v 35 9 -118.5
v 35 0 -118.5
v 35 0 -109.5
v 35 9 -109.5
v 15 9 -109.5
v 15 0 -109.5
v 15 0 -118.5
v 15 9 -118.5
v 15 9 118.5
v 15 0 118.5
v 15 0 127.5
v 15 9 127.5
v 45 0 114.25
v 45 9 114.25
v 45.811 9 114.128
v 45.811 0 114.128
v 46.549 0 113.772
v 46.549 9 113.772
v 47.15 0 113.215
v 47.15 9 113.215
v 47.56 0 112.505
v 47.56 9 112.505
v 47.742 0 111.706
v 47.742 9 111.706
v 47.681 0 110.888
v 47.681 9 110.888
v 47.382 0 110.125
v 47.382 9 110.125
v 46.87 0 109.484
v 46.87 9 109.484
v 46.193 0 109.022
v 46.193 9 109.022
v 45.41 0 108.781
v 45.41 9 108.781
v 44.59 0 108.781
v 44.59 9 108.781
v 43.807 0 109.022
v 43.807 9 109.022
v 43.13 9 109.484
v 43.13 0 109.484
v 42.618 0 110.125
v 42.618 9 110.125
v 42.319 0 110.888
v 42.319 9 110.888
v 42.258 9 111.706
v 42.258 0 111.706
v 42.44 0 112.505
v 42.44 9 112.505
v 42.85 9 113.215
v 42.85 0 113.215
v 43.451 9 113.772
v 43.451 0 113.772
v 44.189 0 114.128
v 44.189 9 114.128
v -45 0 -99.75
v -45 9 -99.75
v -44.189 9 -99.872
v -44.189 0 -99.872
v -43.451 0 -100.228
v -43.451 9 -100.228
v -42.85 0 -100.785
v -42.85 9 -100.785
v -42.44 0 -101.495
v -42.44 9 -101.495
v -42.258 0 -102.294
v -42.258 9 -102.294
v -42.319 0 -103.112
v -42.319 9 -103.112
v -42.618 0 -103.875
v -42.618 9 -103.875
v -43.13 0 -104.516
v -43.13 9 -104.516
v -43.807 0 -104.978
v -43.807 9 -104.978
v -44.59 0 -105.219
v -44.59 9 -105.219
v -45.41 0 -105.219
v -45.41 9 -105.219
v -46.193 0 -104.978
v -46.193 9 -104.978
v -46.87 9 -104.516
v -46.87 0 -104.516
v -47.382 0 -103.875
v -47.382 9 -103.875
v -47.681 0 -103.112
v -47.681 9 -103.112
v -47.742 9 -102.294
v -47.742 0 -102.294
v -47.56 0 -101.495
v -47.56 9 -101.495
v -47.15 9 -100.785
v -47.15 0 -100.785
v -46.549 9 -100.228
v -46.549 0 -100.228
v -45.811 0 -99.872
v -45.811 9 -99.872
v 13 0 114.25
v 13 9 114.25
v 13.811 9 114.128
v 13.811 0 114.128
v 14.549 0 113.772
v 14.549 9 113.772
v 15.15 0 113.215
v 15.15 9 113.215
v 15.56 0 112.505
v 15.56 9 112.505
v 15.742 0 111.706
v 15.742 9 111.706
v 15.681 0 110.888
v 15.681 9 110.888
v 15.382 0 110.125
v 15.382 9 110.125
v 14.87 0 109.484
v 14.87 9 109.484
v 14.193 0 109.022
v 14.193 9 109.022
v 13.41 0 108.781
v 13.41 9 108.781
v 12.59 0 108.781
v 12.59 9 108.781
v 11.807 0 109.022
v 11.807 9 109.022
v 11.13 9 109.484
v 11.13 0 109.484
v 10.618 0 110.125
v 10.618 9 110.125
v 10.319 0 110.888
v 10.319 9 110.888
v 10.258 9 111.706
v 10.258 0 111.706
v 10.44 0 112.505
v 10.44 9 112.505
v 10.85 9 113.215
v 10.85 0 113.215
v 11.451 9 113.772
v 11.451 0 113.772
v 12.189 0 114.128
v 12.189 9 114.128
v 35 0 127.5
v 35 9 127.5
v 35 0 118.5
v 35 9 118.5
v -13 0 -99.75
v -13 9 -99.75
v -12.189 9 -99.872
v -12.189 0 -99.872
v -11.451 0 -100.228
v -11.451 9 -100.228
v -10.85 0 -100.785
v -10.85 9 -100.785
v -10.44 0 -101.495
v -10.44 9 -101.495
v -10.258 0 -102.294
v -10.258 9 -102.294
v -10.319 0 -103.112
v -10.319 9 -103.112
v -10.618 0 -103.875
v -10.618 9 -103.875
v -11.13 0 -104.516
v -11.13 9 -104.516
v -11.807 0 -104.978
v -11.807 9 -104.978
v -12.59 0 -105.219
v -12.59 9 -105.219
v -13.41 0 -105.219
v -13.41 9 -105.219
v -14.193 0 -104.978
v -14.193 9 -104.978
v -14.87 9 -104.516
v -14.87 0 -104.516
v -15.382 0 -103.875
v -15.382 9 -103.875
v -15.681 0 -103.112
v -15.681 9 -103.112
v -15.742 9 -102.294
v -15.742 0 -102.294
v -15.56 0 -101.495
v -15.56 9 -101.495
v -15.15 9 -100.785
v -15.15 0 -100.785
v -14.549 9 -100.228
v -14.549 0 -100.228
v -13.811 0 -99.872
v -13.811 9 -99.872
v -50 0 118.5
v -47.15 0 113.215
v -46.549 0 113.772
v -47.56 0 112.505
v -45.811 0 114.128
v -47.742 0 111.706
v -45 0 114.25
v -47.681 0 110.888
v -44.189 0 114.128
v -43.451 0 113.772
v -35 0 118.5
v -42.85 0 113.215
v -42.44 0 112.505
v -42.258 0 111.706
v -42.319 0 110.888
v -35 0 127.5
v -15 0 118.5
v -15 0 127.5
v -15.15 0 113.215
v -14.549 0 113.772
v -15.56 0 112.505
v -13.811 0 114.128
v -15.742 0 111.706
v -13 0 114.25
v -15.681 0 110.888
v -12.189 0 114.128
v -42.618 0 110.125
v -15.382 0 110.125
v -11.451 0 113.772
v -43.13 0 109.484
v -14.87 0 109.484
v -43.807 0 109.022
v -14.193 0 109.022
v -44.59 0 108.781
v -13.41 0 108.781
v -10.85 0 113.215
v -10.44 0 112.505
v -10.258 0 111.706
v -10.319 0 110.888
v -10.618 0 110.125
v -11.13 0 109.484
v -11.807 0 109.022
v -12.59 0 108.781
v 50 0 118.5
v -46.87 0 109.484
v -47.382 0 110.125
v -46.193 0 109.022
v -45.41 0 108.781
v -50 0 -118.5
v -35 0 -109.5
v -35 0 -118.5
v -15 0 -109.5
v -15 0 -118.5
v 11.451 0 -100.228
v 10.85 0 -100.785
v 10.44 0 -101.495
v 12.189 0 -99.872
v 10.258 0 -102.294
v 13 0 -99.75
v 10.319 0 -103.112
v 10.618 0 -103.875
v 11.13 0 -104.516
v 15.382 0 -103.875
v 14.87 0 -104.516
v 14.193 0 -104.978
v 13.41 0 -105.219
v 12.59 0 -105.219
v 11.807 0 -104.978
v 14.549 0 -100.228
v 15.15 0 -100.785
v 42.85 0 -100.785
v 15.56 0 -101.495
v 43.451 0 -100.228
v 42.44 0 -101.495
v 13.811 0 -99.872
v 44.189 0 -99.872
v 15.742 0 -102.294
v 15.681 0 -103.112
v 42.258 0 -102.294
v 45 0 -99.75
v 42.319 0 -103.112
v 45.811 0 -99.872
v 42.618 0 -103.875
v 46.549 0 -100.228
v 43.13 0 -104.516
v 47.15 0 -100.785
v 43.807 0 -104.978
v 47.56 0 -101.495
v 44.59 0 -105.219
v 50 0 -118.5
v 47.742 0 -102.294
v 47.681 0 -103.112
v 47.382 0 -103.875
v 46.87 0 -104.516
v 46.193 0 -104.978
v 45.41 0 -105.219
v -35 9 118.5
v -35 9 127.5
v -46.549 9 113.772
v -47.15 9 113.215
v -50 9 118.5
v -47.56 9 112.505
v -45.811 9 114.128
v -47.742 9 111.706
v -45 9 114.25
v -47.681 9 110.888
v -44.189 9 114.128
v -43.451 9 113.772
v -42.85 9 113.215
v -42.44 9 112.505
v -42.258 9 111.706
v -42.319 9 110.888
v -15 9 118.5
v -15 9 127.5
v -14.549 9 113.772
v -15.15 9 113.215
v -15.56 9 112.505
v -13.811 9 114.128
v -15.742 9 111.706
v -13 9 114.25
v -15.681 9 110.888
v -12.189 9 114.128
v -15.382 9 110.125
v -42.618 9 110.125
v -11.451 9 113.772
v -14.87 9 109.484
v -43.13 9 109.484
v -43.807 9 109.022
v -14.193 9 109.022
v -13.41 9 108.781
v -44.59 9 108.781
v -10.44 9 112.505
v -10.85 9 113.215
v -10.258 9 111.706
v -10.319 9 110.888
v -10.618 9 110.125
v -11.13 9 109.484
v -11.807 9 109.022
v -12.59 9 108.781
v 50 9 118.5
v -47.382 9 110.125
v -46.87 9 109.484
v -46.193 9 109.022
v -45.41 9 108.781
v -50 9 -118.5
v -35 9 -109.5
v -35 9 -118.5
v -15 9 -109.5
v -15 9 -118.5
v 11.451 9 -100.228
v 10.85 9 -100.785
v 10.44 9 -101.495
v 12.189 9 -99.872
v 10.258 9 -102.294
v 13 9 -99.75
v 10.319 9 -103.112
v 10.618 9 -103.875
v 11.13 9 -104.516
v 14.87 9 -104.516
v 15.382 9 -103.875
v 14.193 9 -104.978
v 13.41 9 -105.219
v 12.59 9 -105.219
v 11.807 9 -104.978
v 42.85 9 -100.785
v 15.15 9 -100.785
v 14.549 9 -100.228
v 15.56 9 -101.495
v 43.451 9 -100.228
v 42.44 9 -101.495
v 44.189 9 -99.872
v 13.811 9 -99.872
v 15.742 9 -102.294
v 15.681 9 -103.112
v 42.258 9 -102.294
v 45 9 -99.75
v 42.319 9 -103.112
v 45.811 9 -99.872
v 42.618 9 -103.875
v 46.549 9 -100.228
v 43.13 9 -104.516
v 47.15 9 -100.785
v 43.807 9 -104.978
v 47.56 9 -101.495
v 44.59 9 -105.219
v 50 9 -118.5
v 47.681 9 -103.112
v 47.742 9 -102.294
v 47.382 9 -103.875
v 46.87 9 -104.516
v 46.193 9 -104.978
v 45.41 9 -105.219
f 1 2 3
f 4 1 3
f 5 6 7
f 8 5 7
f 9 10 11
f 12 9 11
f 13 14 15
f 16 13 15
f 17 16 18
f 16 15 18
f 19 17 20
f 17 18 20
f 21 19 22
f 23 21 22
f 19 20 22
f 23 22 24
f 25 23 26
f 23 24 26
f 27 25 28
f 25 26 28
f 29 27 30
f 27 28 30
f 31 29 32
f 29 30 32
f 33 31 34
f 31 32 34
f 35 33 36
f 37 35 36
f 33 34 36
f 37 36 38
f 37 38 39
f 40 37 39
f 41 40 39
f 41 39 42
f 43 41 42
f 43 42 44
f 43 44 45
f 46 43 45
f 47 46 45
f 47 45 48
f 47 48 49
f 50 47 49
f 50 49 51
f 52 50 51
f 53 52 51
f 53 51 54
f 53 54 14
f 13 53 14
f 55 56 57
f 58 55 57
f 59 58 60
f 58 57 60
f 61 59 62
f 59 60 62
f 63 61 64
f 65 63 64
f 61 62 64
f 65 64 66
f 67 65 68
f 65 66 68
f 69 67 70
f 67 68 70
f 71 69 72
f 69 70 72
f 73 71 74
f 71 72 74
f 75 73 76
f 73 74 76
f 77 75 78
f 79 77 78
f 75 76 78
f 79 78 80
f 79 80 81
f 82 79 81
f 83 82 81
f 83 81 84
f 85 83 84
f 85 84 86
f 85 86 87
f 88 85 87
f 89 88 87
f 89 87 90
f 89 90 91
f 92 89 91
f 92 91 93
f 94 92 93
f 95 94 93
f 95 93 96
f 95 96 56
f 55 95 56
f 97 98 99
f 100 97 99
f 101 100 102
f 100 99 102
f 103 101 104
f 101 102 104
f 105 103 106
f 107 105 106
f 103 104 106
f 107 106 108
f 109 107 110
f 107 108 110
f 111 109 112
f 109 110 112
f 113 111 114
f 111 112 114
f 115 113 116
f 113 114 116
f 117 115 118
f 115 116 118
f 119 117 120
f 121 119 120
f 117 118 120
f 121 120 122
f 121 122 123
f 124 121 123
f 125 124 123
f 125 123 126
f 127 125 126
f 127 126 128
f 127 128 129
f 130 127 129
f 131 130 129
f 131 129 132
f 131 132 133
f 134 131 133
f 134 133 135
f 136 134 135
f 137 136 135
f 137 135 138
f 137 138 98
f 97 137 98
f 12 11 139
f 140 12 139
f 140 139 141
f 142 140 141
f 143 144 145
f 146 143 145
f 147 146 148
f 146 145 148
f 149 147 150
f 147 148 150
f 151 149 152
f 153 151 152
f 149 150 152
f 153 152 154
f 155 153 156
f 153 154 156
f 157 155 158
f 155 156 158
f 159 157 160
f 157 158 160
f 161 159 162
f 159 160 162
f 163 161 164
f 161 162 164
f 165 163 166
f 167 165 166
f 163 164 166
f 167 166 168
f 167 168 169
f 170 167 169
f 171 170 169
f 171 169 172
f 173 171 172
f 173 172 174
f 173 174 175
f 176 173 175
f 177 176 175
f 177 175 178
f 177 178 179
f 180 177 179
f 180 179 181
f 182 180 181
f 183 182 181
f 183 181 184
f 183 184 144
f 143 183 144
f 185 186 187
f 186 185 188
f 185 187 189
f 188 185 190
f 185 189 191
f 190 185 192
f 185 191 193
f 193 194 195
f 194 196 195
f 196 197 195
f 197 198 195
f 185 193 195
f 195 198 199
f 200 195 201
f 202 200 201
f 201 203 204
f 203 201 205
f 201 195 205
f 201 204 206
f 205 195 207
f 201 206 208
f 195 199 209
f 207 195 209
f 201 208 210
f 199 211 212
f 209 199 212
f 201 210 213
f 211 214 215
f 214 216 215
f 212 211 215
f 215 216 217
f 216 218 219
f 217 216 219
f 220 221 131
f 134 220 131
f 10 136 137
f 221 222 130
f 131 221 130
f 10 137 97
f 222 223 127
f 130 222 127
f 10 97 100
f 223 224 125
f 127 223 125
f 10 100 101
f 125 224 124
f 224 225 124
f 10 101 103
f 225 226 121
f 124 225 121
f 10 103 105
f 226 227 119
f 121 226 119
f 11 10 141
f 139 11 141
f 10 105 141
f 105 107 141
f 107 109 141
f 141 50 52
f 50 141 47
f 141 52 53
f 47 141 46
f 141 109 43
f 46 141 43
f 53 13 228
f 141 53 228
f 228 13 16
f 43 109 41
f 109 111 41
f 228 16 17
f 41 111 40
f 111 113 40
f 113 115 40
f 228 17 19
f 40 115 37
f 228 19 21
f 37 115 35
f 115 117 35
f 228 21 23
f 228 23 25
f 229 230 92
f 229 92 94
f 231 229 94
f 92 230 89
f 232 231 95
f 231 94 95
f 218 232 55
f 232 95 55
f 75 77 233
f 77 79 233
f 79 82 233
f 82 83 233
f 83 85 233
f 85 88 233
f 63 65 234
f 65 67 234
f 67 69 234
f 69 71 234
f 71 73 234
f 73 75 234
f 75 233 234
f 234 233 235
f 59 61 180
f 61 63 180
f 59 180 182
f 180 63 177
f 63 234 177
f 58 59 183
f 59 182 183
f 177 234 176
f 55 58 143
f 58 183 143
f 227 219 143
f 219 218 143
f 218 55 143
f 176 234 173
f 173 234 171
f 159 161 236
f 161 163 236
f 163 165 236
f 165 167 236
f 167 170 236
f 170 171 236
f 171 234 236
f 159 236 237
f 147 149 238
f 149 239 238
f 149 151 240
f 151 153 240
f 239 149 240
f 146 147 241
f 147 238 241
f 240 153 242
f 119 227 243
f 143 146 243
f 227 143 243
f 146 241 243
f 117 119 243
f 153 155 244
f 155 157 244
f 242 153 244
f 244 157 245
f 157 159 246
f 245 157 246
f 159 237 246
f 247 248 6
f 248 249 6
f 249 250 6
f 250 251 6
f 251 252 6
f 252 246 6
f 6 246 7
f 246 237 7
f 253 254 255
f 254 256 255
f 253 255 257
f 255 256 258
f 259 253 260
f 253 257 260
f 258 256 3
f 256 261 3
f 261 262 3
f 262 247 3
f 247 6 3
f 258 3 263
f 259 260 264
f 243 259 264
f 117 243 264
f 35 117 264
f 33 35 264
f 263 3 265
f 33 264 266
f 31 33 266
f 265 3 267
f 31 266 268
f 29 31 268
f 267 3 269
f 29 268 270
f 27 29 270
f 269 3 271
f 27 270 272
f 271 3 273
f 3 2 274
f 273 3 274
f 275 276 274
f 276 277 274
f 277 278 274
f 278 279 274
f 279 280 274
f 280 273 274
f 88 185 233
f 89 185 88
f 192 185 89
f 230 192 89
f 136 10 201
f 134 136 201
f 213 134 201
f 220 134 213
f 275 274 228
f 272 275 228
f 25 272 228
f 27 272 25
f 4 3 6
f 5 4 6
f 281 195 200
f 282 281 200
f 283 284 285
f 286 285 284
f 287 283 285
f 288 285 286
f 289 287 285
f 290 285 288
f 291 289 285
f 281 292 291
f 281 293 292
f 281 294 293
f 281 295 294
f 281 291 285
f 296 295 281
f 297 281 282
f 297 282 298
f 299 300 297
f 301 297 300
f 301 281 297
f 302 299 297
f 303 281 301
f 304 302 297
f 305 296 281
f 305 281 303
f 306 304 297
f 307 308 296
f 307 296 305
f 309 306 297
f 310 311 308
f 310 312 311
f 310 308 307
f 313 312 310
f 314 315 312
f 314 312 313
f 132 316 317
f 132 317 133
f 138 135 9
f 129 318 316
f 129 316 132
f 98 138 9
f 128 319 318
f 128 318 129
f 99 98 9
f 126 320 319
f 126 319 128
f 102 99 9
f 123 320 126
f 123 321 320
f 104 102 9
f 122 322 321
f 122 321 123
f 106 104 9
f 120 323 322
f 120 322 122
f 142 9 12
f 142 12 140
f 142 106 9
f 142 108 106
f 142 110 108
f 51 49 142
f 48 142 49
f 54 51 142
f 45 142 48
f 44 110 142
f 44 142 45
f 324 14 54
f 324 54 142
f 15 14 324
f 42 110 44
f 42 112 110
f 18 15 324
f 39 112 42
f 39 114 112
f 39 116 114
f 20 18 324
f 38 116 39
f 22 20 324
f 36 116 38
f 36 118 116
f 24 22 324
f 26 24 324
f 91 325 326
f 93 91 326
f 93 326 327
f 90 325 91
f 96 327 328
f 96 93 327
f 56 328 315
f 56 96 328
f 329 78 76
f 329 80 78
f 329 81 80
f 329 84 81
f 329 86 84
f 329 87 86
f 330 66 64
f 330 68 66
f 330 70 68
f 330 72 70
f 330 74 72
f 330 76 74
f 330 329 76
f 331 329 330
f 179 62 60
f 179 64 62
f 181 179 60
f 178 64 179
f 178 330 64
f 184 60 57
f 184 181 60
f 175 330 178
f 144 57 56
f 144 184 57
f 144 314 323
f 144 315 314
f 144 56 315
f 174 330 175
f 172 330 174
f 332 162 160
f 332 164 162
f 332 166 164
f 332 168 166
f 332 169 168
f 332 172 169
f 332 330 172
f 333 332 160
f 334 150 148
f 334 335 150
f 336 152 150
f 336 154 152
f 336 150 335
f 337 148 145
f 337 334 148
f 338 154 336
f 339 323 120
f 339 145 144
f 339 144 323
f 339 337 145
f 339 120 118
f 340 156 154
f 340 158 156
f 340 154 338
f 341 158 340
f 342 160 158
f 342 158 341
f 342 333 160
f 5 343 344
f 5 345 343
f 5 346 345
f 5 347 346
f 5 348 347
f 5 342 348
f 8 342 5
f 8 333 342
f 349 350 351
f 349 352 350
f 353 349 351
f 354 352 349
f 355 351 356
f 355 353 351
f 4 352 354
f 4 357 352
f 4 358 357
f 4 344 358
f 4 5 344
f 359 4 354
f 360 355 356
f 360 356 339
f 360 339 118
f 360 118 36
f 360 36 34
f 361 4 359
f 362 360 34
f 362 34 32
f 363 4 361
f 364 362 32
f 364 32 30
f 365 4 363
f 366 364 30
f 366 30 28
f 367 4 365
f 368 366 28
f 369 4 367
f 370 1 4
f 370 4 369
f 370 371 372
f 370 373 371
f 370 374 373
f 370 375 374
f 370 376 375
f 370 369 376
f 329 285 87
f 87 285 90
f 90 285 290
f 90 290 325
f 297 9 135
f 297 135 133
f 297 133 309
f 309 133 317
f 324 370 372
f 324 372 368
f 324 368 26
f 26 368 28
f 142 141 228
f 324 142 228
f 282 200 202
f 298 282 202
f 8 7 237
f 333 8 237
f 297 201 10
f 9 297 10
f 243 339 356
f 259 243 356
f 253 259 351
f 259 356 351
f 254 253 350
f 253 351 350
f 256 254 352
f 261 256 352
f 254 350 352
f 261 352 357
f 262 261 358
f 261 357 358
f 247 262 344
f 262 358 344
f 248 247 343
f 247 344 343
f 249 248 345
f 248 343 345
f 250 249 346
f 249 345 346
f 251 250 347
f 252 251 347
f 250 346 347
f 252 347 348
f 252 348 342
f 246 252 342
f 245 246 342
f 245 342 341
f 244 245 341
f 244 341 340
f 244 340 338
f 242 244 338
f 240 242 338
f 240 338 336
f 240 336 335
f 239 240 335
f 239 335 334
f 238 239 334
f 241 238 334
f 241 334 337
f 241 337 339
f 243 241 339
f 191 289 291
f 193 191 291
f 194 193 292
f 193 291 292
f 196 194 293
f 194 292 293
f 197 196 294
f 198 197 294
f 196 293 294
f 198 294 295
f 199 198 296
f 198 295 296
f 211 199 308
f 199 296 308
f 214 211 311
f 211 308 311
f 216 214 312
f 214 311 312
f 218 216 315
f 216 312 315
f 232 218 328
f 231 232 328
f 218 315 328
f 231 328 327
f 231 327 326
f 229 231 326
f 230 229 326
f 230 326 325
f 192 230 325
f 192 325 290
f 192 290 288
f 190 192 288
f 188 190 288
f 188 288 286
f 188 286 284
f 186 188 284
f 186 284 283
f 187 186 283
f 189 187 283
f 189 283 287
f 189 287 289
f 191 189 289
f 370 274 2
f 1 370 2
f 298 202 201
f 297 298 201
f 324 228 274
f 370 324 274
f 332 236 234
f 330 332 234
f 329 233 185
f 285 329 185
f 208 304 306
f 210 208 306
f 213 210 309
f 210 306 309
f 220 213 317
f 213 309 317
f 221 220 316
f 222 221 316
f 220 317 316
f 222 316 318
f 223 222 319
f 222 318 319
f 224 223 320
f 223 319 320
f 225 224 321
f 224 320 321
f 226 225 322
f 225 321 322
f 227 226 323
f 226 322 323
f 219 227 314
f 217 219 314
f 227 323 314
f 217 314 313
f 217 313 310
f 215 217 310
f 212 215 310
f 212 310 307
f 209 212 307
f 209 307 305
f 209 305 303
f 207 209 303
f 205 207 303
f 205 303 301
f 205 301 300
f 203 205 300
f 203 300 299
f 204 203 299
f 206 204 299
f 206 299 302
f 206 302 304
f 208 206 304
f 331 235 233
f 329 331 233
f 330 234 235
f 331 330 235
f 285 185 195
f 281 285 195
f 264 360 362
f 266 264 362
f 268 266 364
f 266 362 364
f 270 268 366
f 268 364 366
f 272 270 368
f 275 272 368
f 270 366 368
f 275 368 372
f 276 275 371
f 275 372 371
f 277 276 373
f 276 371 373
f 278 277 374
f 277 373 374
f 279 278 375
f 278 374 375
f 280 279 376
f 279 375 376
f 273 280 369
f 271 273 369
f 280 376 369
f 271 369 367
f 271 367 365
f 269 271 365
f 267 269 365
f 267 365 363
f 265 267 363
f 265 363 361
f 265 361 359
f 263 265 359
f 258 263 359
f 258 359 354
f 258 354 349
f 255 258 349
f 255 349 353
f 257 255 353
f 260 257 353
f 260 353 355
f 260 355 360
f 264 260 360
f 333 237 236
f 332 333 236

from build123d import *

# Parameters (mm, degrees)
BOSS_EXTRUDE1_DEPTH = 9
SKETCH2_R           = 2.75
CUT_EXTRUDE1_DEPTH  = 10


with BuildPart() as part:
    # Sketch1 → Boss-Extrude1 (new body)
    with BuildSketch(Plane(origin=(0, 0, 0), x_dir=(1, 0, 0), z_dir=(0, 1, 0))):
        Polygon((-35, 118.5), (-50, 118.5), (-50, -118.5), (-35, -118.5), (-35, -127.5), (-15, -127.5), (-15, -118.5), (15, -118.5), (15, -127.5), (35, -127.5), (35, -118.5), (50, -118.5), (50, 118.5), (35, 118.5), (35, 109.5), (15, 109.5), (15, 118.5), (-15, 118.5), (-15, 109.5), (-35, 109.5), align=None)
    extrude(amount=BOSS_EXTRUDE1_DEPTH)

    # Sketch2 → Cut-Extrude1 (cut)
    with BuildSketch(Plane(origin=(0, 9, 0), x_dir=(1, 0, 0), z_dir=(0, 1, 0))):
        with Locations(Location((-45, -111.5, 0), (0, 0, 270))):
            Circle(SKETCH2_R)
        with Locations(Location((-13, -111.5, 0), (0, 0, 270))):
            Circle(SKETCH2_R)
        with Locations(Location((13, -111.5, 0), (0, 0, 270))):
            Circle(SKETCH2_R)
        with Locations(Location((45, -111.5, 0), (0, 0, 270))):
            Circle(SKETCH2_R)
        with Locations(Location((-45, 102.5, 0), (0, 0, 270))):
            Circle(SKETCH2_R)
        with Locations(Location((-13, 102.5, 0), (0, 0, 270))):
            Circle(SKETCH2_R)
        with Locations(Location((13, 102.5, 0), (0, 0, 270))):
            Circle(SKETCH2_R)
        with Locations(Location((45, 102.5, 0), (0, 0, 270))):
            Circle(SKETCH2_R)
    extrude(amount=-CUT_EXTRUDE1_DEPTH, mode=Mode.SUBTRACT)


solid = part.part
